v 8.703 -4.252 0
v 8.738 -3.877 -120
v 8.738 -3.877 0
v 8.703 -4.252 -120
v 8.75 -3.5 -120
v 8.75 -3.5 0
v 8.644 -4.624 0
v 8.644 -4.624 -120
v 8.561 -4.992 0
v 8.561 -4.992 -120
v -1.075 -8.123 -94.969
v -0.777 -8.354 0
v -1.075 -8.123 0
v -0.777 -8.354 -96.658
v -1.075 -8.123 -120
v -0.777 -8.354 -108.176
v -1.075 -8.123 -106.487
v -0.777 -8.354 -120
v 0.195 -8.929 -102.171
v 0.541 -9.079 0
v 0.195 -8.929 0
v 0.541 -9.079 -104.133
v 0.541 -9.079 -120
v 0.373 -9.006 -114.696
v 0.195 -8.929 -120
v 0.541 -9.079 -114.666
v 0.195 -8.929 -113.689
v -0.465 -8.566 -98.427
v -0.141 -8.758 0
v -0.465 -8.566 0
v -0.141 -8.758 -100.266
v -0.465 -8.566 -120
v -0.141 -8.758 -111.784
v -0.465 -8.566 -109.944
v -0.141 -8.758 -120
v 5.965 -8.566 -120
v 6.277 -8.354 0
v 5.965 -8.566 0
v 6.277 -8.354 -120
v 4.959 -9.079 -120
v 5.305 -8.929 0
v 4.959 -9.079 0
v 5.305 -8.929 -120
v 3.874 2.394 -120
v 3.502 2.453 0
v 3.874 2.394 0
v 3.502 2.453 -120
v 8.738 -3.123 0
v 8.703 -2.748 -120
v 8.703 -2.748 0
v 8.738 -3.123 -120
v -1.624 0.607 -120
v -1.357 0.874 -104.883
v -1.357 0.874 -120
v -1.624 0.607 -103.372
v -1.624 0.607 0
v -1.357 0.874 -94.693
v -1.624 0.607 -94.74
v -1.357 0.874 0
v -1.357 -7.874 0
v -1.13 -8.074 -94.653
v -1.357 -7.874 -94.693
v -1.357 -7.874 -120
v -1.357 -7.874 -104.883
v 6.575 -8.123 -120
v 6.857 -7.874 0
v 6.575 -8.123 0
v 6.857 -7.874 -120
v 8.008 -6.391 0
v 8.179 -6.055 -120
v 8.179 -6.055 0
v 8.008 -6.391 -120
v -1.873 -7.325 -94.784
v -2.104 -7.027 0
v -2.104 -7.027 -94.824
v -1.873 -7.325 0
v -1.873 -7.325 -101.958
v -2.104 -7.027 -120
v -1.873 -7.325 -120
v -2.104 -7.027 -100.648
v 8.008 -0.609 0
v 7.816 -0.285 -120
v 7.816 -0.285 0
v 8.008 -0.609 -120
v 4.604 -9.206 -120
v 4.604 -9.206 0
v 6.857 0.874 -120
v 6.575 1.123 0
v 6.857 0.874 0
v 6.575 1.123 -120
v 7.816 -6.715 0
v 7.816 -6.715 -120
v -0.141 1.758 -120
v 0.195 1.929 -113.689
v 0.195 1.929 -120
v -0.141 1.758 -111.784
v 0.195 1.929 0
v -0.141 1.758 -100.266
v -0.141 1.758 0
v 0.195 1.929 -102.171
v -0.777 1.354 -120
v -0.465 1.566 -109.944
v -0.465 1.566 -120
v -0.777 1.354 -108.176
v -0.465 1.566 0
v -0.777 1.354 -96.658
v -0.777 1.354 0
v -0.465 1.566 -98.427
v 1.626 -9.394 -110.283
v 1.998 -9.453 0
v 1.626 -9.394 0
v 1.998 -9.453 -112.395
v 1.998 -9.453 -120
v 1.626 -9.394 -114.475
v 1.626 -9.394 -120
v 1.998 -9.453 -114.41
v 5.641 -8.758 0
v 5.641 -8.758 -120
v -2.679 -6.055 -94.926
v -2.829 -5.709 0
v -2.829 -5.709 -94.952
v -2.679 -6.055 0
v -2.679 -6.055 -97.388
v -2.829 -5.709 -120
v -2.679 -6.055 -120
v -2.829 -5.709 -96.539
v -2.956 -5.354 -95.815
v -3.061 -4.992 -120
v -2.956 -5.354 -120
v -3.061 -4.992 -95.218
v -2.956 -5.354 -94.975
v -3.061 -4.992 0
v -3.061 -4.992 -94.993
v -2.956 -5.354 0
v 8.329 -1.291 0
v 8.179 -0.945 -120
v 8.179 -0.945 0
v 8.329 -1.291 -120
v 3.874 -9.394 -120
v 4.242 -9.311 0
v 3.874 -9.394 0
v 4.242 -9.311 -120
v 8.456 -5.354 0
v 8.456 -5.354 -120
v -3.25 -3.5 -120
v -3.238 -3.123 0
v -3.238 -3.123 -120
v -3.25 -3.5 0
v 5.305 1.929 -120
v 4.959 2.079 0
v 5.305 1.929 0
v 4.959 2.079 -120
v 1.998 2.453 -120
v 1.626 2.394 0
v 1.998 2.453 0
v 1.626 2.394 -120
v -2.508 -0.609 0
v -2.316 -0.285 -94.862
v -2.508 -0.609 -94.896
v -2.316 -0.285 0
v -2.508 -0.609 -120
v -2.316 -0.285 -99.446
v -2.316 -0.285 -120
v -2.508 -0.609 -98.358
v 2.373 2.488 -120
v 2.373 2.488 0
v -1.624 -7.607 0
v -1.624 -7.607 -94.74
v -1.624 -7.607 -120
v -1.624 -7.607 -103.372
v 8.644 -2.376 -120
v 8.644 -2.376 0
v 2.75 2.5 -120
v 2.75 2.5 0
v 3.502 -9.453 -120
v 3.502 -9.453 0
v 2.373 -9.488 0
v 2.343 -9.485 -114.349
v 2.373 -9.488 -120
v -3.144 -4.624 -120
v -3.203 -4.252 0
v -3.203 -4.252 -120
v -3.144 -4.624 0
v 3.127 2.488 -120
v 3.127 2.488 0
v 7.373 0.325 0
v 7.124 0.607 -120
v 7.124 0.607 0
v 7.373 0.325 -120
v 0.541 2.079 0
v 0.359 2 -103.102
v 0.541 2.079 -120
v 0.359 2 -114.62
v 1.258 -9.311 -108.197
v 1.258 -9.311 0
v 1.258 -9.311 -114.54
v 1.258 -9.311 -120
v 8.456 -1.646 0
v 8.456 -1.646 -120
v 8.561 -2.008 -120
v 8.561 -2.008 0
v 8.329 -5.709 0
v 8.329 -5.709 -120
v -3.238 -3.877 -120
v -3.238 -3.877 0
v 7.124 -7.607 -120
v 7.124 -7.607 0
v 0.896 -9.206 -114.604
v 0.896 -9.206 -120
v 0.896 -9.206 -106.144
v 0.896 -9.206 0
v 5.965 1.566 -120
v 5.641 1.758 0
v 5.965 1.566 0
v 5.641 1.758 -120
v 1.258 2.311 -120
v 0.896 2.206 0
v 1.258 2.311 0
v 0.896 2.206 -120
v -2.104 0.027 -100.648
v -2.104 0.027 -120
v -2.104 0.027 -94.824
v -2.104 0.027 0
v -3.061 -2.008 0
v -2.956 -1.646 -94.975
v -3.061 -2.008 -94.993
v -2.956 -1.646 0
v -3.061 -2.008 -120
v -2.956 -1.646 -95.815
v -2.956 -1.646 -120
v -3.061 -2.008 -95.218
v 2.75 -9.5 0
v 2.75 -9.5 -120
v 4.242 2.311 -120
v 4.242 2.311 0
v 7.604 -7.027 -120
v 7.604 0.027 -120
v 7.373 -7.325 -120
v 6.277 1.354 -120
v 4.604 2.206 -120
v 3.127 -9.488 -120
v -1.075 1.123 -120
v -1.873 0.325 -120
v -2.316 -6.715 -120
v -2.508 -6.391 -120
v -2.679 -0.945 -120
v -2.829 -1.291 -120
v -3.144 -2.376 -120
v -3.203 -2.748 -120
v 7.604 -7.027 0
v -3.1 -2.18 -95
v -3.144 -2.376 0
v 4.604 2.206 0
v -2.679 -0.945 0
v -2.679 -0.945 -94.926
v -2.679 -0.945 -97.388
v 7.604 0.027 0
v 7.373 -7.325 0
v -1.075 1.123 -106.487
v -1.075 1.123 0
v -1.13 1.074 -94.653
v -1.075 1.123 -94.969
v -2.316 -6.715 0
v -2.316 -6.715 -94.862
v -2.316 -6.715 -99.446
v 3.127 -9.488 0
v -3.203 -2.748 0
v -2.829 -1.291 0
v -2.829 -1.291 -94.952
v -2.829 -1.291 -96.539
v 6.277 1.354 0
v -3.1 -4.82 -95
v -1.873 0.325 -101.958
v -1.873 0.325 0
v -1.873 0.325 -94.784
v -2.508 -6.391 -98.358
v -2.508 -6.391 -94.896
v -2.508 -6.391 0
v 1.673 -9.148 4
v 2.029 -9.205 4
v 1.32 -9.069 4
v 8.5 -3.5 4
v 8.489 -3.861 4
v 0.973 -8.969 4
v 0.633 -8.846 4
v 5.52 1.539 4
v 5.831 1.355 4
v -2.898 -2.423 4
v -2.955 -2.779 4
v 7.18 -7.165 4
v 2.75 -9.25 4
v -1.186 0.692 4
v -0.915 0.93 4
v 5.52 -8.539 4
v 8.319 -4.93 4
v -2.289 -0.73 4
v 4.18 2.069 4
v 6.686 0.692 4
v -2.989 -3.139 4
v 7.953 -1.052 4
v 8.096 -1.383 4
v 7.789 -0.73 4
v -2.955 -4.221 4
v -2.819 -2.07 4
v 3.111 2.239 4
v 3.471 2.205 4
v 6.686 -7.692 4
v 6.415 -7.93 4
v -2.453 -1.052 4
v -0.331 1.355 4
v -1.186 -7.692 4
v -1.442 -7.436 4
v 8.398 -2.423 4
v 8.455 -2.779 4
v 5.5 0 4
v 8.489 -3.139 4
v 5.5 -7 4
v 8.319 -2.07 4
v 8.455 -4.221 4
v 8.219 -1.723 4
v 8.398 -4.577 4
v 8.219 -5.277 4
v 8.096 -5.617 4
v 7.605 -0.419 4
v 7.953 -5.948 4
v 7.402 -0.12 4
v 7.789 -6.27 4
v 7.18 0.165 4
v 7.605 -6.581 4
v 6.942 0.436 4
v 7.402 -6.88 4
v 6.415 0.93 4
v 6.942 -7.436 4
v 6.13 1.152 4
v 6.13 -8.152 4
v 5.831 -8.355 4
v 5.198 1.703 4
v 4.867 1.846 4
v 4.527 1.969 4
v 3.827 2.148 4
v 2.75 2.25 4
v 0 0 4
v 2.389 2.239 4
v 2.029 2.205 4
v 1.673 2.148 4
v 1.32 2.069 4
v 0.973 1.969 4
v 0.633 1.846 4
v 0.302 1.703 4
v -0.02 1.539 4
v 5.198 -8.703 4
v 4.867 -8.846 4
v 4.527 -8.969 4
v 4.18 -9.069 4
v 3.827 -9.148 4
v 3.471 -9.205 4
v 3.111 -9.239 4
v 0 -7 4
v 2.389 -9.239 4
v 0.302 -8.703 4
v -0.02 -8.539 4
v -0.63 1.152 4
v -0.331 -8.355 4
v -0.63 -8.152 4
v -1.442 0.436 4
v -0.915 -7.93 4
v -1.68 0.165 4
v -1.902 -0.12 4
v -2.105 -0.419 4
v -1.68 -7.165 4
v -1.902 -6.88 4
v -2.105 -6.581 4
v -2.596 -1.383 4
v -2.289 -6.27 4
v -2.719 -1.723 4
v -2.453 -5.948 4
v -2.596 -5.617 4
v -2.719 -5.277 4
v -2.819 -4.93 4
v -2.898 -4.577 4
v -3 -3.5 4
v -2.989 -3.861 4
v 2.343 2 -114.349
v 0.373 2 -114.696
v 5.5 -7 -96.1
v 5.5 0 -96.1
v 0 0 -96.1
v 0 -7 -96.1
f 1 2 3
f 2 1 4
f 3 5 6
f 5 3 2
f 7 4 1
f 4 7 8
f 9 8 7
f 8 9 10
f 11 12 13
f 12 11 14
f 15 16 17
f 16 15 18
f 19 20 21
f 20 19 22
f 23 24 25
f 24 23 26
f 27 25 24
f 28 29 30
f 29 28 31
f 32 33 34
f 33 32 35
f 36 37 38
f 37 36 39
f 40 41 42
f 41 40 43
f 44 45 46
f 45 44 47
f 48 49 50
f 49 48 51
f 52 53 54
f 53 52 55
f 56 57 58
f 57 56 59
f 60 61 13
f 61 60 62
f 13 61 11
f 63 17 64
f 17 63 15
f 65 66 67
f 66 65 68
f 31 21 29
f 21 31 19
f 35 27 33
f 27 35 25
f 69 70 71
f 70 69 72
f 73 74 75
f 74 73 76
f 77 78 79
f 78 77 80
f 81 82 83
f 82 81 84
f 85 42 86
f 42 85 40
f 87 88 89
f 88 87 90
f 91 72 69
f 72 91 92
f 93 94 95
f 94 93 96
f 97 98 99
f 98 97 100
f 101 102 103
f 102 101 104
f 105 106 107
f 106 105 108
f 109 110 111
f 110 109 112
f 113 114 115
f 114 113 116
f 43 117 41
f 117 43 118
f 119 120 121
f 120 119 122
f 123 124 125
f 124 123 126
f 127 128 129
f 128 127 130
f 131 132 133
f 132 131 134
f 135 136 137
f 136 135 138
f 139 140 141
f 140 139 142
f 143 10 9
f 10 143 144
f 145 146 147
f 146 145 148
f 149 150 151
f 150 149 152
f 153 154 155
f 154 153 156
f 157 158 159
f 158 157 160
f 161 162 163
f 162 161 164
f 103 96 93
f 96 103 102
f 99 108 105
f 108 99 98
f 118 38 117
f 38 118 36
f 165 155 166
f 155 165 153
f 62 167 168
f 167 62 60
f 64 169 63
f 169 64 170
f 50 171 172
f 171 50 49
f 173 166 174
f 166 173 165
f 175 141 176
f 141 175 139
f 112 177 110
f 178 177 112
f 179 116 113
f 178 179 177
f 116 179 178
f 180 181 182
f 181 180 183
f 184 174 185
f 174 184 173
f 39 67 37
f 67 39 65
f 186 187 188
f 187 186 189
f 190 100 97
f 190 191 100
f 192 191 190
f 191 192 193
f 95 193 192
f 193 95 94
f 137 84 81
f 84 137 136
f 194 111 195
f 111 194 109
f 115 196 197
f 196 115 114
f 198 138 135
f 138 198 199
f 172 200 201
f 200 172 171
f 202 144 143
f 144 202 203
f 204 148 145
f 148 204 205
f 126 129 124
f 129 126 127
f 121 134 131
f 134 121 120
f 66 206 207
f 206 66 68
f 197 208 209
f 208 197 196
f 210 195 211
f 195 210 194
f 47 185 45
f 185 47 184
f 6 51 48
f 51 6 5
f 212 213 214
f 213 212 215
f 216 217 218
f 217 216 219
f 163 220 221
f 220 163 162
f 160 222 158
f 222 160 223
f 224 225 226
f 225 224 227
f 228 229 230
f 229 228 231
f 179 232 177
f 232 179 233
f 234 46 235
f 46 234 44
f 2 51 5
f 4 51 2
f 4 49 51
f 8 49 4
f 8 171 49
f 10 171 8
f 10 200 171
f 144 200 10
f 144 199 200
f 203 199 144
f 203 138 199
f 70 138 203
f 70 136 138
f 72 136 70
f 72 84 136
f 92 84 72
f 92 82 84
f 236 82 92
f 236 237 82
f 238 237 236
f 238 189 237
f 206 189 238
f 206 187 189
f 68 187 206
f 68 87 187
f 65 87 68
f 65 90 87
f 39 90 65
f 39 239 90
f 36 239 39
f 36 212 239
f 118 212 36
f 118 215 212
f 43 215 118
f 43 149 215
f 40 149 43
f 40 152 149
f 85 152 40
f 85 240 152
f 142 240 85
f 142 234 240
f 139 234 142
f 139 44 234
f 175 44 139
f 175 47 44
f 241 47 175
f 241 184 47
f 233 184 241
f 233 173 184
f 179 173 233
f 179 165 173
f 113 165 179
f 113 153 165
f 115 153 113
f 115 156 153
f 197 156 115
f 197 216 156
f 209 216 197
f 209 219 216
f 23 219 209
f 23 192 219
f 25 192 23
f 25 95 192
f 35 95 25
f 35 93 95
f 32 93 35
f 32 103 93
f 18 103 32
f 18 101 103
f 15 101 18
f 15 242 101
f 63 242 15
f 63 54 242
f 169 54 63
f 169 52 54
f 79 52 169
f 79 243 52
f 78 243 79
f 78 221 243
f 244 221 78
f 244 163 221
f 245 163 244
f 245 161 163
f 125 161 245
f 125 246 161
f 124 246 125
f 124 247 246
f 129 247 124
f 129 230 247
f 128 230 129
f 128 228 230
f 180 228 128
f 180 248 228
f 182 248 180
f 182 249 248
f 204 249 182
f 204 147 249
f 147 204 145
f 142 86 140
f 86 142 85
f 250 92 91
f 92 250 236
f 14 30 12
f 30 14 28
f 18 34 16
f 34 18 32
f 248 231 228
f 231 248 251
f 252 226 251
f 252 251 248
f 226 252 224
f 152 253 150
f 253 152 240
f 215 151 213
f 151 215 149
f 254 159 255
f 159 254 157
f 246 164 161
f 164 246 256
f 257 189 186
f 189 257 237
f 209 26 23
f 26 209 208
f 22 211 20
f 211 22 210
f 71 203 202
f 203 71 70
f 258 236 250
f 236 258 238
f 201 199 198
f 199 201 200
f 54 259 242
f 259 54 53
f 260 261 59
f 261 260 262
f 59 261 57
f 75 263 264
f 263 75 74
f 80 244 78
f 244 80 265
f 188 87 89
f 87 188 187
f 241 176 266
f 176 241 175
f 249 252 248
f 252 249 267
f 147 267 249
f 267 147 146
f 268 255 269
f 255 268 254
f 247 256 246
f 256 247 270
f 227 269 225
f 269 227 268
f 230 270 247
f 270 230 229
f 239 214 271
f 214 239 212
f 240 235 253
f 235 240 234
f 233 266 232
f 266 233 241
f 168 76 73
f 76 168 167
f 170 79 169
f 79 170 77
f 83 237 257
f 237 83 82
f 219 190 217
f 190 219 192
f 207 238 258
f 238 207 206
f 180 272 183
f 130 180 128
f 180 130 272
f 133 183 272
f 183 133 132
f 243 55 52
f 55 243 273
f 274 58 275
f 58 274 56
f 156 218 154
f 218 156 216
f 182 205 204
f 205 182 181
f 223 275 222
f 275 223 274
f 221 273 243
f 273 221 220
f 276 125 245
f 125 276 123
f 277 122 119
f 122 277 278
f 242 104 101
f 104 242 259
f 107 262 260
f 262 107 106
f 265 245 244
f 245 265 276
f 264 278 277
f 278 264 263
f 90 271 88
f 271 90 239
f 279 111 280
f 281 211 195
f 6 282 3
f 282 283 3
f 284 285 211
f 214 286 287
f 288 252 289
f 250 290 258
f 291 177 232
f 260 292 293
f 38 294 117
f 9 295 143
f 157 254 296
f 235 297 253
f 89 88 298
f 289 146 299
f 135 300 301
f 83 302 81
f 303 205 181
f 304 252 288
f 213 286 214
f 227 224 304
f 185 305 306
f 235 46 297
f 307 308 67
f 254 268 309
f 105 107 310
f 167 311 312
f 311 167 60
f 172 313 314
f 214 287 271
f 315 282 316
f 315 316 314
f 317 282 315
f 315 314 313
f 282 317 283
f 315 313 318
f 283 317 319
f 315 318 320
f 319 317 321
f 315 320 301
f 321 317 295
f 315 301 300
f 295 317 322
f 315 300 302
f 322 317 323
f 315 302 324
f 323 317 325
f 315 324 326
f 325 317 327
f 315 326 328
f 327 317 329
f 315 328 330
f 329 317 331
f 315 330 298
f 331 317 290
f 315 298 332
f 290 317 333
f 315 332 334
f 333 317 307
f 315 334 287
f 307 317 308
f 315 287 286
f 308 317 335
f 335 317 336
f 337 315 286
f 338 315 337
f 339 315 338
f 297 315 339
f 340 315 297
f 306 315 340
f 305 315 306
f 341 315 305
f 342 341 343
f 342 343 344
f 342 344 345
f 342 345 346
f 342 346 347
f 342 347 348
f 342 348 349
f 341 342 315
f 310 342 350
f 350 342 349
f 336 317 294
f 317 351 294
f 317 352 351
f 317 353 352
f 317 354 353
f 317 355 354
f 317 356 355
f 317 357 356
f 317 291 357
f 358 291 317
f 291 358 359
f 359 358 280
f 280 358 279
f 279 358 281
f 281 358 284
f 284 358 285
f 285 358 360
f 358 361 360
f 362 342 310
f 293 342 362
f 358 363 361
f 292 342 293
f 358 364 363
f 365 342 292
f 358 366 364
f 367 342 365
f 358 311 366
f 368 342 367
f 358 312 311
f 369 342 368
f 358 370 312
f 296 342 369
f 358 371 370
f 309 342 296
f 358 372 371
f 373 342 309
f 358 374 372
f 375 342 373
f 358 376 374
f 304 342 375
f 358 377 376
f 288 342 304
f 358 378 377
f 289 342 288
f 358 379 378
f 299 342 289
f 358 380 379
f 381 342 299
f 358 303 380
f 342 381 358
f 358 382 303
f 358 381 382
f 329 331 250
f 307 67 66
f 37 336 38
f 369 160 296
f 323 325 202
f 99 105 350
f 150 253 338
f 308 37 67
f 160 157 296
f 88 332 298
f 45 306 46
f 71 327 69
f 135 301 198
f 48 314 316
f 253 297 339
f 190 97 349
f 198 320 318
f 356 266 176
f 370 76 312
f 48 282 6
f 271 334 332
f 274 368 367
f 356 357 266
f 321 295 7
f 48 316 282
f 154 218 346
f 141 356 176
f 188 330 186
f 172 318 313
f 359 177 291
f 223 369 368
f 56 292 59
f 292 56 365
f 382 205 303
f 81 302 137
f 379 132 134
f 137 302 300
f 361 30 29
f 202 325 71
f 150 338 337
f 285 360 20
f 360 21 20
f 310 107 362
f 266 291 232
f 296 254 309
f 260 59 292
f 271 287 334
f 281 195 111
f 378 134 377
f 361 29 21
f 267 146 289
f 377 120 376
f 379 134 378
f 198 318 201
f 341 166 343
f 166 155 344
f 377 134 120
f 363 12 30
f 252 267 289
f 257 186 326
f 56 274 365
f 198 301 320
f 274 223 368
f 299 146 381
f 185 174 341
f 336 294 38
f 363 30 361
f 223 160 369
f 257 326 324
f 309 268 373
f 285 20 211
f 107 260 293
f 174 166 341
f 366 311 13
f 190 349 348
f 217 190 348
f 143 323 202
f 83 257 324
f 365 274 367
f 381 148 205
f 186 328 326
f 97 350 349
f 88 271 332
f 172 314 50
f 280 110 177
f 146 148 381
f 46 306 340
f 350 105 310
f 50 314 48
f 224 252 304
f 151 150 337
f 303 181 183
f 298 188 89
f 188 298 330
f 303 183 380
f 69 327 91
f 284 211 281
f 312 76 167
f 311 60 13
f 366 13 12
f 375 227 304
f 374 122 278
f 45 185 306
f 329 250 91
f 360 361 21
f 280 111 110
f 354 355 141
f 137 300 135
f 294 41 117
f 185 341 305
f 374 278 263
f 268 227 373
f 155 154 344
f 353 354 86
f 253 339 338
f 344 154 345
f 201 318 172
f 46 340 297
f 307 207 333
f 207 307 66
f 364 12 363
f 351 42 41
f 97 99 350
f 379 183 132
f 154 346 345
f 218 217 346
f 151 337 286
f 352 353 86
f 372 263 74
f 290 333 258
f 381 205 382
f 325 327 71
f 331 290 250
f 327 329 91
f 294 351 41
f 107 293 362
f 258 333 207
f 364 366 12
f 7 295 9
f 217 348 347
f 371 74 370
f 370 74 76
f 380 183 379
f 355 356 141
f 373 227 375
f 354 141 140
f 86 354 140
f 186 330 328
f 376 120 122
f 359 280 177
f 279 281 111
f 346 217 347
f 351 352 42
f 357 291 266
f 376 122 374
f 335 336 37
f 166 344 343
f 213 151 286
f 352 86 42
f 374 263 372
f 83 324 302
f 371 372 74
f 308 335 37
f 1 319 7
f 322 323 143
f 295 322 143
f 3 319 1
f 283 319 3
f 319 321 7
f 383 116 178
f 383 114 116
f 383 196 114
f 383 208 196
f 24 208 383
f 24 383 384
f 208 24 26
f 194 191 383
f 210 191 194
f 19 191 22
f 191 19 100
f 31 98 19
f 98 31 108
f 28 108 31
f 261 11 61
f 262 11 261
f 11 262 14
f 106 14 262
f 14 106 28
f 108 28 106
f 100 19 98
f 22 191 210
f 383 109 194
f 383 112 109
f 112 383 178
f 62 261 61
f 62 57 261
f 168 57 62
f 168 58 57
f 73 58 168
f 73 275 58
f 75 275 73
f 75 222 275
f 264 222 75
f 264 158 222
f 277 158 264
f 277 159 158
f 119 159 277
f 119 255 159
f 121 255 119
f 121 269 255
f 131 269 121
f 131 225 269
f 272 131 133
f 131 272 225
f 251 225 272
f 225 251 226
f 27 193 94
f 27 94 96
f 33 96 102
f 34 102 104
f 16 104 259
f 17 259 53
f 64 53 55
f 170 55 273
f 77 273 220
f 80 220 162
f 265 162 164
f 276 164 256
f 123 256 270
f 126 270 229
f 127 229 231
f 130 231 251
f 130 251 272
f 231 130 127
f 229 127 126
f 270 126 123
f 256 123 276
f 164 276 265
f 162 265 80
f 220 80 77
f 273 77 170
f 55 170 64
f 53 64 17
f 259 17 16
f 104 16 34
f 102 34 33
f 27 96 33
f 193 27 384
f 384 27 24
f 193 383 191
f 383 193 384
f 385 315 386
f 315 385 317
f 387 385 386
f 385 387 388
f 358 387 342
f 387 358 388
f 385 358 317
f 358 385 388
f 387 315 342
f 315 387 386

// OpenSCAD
$fn=100;
rotate([180,0,0])
difference(){
union(){
translate([2.75,3.5,0])
    cylinder(d=12,h=120);
    translate([2.75,3.5,-4])
cylinder(d1=11.5,d2=12,h=4);
}

translate([-3.1,-2,95])
rotate([0,10,0])
cube([2,12,20]);
translate([0,0,-4])
cube([5.5,7,100.1]);
    
}
